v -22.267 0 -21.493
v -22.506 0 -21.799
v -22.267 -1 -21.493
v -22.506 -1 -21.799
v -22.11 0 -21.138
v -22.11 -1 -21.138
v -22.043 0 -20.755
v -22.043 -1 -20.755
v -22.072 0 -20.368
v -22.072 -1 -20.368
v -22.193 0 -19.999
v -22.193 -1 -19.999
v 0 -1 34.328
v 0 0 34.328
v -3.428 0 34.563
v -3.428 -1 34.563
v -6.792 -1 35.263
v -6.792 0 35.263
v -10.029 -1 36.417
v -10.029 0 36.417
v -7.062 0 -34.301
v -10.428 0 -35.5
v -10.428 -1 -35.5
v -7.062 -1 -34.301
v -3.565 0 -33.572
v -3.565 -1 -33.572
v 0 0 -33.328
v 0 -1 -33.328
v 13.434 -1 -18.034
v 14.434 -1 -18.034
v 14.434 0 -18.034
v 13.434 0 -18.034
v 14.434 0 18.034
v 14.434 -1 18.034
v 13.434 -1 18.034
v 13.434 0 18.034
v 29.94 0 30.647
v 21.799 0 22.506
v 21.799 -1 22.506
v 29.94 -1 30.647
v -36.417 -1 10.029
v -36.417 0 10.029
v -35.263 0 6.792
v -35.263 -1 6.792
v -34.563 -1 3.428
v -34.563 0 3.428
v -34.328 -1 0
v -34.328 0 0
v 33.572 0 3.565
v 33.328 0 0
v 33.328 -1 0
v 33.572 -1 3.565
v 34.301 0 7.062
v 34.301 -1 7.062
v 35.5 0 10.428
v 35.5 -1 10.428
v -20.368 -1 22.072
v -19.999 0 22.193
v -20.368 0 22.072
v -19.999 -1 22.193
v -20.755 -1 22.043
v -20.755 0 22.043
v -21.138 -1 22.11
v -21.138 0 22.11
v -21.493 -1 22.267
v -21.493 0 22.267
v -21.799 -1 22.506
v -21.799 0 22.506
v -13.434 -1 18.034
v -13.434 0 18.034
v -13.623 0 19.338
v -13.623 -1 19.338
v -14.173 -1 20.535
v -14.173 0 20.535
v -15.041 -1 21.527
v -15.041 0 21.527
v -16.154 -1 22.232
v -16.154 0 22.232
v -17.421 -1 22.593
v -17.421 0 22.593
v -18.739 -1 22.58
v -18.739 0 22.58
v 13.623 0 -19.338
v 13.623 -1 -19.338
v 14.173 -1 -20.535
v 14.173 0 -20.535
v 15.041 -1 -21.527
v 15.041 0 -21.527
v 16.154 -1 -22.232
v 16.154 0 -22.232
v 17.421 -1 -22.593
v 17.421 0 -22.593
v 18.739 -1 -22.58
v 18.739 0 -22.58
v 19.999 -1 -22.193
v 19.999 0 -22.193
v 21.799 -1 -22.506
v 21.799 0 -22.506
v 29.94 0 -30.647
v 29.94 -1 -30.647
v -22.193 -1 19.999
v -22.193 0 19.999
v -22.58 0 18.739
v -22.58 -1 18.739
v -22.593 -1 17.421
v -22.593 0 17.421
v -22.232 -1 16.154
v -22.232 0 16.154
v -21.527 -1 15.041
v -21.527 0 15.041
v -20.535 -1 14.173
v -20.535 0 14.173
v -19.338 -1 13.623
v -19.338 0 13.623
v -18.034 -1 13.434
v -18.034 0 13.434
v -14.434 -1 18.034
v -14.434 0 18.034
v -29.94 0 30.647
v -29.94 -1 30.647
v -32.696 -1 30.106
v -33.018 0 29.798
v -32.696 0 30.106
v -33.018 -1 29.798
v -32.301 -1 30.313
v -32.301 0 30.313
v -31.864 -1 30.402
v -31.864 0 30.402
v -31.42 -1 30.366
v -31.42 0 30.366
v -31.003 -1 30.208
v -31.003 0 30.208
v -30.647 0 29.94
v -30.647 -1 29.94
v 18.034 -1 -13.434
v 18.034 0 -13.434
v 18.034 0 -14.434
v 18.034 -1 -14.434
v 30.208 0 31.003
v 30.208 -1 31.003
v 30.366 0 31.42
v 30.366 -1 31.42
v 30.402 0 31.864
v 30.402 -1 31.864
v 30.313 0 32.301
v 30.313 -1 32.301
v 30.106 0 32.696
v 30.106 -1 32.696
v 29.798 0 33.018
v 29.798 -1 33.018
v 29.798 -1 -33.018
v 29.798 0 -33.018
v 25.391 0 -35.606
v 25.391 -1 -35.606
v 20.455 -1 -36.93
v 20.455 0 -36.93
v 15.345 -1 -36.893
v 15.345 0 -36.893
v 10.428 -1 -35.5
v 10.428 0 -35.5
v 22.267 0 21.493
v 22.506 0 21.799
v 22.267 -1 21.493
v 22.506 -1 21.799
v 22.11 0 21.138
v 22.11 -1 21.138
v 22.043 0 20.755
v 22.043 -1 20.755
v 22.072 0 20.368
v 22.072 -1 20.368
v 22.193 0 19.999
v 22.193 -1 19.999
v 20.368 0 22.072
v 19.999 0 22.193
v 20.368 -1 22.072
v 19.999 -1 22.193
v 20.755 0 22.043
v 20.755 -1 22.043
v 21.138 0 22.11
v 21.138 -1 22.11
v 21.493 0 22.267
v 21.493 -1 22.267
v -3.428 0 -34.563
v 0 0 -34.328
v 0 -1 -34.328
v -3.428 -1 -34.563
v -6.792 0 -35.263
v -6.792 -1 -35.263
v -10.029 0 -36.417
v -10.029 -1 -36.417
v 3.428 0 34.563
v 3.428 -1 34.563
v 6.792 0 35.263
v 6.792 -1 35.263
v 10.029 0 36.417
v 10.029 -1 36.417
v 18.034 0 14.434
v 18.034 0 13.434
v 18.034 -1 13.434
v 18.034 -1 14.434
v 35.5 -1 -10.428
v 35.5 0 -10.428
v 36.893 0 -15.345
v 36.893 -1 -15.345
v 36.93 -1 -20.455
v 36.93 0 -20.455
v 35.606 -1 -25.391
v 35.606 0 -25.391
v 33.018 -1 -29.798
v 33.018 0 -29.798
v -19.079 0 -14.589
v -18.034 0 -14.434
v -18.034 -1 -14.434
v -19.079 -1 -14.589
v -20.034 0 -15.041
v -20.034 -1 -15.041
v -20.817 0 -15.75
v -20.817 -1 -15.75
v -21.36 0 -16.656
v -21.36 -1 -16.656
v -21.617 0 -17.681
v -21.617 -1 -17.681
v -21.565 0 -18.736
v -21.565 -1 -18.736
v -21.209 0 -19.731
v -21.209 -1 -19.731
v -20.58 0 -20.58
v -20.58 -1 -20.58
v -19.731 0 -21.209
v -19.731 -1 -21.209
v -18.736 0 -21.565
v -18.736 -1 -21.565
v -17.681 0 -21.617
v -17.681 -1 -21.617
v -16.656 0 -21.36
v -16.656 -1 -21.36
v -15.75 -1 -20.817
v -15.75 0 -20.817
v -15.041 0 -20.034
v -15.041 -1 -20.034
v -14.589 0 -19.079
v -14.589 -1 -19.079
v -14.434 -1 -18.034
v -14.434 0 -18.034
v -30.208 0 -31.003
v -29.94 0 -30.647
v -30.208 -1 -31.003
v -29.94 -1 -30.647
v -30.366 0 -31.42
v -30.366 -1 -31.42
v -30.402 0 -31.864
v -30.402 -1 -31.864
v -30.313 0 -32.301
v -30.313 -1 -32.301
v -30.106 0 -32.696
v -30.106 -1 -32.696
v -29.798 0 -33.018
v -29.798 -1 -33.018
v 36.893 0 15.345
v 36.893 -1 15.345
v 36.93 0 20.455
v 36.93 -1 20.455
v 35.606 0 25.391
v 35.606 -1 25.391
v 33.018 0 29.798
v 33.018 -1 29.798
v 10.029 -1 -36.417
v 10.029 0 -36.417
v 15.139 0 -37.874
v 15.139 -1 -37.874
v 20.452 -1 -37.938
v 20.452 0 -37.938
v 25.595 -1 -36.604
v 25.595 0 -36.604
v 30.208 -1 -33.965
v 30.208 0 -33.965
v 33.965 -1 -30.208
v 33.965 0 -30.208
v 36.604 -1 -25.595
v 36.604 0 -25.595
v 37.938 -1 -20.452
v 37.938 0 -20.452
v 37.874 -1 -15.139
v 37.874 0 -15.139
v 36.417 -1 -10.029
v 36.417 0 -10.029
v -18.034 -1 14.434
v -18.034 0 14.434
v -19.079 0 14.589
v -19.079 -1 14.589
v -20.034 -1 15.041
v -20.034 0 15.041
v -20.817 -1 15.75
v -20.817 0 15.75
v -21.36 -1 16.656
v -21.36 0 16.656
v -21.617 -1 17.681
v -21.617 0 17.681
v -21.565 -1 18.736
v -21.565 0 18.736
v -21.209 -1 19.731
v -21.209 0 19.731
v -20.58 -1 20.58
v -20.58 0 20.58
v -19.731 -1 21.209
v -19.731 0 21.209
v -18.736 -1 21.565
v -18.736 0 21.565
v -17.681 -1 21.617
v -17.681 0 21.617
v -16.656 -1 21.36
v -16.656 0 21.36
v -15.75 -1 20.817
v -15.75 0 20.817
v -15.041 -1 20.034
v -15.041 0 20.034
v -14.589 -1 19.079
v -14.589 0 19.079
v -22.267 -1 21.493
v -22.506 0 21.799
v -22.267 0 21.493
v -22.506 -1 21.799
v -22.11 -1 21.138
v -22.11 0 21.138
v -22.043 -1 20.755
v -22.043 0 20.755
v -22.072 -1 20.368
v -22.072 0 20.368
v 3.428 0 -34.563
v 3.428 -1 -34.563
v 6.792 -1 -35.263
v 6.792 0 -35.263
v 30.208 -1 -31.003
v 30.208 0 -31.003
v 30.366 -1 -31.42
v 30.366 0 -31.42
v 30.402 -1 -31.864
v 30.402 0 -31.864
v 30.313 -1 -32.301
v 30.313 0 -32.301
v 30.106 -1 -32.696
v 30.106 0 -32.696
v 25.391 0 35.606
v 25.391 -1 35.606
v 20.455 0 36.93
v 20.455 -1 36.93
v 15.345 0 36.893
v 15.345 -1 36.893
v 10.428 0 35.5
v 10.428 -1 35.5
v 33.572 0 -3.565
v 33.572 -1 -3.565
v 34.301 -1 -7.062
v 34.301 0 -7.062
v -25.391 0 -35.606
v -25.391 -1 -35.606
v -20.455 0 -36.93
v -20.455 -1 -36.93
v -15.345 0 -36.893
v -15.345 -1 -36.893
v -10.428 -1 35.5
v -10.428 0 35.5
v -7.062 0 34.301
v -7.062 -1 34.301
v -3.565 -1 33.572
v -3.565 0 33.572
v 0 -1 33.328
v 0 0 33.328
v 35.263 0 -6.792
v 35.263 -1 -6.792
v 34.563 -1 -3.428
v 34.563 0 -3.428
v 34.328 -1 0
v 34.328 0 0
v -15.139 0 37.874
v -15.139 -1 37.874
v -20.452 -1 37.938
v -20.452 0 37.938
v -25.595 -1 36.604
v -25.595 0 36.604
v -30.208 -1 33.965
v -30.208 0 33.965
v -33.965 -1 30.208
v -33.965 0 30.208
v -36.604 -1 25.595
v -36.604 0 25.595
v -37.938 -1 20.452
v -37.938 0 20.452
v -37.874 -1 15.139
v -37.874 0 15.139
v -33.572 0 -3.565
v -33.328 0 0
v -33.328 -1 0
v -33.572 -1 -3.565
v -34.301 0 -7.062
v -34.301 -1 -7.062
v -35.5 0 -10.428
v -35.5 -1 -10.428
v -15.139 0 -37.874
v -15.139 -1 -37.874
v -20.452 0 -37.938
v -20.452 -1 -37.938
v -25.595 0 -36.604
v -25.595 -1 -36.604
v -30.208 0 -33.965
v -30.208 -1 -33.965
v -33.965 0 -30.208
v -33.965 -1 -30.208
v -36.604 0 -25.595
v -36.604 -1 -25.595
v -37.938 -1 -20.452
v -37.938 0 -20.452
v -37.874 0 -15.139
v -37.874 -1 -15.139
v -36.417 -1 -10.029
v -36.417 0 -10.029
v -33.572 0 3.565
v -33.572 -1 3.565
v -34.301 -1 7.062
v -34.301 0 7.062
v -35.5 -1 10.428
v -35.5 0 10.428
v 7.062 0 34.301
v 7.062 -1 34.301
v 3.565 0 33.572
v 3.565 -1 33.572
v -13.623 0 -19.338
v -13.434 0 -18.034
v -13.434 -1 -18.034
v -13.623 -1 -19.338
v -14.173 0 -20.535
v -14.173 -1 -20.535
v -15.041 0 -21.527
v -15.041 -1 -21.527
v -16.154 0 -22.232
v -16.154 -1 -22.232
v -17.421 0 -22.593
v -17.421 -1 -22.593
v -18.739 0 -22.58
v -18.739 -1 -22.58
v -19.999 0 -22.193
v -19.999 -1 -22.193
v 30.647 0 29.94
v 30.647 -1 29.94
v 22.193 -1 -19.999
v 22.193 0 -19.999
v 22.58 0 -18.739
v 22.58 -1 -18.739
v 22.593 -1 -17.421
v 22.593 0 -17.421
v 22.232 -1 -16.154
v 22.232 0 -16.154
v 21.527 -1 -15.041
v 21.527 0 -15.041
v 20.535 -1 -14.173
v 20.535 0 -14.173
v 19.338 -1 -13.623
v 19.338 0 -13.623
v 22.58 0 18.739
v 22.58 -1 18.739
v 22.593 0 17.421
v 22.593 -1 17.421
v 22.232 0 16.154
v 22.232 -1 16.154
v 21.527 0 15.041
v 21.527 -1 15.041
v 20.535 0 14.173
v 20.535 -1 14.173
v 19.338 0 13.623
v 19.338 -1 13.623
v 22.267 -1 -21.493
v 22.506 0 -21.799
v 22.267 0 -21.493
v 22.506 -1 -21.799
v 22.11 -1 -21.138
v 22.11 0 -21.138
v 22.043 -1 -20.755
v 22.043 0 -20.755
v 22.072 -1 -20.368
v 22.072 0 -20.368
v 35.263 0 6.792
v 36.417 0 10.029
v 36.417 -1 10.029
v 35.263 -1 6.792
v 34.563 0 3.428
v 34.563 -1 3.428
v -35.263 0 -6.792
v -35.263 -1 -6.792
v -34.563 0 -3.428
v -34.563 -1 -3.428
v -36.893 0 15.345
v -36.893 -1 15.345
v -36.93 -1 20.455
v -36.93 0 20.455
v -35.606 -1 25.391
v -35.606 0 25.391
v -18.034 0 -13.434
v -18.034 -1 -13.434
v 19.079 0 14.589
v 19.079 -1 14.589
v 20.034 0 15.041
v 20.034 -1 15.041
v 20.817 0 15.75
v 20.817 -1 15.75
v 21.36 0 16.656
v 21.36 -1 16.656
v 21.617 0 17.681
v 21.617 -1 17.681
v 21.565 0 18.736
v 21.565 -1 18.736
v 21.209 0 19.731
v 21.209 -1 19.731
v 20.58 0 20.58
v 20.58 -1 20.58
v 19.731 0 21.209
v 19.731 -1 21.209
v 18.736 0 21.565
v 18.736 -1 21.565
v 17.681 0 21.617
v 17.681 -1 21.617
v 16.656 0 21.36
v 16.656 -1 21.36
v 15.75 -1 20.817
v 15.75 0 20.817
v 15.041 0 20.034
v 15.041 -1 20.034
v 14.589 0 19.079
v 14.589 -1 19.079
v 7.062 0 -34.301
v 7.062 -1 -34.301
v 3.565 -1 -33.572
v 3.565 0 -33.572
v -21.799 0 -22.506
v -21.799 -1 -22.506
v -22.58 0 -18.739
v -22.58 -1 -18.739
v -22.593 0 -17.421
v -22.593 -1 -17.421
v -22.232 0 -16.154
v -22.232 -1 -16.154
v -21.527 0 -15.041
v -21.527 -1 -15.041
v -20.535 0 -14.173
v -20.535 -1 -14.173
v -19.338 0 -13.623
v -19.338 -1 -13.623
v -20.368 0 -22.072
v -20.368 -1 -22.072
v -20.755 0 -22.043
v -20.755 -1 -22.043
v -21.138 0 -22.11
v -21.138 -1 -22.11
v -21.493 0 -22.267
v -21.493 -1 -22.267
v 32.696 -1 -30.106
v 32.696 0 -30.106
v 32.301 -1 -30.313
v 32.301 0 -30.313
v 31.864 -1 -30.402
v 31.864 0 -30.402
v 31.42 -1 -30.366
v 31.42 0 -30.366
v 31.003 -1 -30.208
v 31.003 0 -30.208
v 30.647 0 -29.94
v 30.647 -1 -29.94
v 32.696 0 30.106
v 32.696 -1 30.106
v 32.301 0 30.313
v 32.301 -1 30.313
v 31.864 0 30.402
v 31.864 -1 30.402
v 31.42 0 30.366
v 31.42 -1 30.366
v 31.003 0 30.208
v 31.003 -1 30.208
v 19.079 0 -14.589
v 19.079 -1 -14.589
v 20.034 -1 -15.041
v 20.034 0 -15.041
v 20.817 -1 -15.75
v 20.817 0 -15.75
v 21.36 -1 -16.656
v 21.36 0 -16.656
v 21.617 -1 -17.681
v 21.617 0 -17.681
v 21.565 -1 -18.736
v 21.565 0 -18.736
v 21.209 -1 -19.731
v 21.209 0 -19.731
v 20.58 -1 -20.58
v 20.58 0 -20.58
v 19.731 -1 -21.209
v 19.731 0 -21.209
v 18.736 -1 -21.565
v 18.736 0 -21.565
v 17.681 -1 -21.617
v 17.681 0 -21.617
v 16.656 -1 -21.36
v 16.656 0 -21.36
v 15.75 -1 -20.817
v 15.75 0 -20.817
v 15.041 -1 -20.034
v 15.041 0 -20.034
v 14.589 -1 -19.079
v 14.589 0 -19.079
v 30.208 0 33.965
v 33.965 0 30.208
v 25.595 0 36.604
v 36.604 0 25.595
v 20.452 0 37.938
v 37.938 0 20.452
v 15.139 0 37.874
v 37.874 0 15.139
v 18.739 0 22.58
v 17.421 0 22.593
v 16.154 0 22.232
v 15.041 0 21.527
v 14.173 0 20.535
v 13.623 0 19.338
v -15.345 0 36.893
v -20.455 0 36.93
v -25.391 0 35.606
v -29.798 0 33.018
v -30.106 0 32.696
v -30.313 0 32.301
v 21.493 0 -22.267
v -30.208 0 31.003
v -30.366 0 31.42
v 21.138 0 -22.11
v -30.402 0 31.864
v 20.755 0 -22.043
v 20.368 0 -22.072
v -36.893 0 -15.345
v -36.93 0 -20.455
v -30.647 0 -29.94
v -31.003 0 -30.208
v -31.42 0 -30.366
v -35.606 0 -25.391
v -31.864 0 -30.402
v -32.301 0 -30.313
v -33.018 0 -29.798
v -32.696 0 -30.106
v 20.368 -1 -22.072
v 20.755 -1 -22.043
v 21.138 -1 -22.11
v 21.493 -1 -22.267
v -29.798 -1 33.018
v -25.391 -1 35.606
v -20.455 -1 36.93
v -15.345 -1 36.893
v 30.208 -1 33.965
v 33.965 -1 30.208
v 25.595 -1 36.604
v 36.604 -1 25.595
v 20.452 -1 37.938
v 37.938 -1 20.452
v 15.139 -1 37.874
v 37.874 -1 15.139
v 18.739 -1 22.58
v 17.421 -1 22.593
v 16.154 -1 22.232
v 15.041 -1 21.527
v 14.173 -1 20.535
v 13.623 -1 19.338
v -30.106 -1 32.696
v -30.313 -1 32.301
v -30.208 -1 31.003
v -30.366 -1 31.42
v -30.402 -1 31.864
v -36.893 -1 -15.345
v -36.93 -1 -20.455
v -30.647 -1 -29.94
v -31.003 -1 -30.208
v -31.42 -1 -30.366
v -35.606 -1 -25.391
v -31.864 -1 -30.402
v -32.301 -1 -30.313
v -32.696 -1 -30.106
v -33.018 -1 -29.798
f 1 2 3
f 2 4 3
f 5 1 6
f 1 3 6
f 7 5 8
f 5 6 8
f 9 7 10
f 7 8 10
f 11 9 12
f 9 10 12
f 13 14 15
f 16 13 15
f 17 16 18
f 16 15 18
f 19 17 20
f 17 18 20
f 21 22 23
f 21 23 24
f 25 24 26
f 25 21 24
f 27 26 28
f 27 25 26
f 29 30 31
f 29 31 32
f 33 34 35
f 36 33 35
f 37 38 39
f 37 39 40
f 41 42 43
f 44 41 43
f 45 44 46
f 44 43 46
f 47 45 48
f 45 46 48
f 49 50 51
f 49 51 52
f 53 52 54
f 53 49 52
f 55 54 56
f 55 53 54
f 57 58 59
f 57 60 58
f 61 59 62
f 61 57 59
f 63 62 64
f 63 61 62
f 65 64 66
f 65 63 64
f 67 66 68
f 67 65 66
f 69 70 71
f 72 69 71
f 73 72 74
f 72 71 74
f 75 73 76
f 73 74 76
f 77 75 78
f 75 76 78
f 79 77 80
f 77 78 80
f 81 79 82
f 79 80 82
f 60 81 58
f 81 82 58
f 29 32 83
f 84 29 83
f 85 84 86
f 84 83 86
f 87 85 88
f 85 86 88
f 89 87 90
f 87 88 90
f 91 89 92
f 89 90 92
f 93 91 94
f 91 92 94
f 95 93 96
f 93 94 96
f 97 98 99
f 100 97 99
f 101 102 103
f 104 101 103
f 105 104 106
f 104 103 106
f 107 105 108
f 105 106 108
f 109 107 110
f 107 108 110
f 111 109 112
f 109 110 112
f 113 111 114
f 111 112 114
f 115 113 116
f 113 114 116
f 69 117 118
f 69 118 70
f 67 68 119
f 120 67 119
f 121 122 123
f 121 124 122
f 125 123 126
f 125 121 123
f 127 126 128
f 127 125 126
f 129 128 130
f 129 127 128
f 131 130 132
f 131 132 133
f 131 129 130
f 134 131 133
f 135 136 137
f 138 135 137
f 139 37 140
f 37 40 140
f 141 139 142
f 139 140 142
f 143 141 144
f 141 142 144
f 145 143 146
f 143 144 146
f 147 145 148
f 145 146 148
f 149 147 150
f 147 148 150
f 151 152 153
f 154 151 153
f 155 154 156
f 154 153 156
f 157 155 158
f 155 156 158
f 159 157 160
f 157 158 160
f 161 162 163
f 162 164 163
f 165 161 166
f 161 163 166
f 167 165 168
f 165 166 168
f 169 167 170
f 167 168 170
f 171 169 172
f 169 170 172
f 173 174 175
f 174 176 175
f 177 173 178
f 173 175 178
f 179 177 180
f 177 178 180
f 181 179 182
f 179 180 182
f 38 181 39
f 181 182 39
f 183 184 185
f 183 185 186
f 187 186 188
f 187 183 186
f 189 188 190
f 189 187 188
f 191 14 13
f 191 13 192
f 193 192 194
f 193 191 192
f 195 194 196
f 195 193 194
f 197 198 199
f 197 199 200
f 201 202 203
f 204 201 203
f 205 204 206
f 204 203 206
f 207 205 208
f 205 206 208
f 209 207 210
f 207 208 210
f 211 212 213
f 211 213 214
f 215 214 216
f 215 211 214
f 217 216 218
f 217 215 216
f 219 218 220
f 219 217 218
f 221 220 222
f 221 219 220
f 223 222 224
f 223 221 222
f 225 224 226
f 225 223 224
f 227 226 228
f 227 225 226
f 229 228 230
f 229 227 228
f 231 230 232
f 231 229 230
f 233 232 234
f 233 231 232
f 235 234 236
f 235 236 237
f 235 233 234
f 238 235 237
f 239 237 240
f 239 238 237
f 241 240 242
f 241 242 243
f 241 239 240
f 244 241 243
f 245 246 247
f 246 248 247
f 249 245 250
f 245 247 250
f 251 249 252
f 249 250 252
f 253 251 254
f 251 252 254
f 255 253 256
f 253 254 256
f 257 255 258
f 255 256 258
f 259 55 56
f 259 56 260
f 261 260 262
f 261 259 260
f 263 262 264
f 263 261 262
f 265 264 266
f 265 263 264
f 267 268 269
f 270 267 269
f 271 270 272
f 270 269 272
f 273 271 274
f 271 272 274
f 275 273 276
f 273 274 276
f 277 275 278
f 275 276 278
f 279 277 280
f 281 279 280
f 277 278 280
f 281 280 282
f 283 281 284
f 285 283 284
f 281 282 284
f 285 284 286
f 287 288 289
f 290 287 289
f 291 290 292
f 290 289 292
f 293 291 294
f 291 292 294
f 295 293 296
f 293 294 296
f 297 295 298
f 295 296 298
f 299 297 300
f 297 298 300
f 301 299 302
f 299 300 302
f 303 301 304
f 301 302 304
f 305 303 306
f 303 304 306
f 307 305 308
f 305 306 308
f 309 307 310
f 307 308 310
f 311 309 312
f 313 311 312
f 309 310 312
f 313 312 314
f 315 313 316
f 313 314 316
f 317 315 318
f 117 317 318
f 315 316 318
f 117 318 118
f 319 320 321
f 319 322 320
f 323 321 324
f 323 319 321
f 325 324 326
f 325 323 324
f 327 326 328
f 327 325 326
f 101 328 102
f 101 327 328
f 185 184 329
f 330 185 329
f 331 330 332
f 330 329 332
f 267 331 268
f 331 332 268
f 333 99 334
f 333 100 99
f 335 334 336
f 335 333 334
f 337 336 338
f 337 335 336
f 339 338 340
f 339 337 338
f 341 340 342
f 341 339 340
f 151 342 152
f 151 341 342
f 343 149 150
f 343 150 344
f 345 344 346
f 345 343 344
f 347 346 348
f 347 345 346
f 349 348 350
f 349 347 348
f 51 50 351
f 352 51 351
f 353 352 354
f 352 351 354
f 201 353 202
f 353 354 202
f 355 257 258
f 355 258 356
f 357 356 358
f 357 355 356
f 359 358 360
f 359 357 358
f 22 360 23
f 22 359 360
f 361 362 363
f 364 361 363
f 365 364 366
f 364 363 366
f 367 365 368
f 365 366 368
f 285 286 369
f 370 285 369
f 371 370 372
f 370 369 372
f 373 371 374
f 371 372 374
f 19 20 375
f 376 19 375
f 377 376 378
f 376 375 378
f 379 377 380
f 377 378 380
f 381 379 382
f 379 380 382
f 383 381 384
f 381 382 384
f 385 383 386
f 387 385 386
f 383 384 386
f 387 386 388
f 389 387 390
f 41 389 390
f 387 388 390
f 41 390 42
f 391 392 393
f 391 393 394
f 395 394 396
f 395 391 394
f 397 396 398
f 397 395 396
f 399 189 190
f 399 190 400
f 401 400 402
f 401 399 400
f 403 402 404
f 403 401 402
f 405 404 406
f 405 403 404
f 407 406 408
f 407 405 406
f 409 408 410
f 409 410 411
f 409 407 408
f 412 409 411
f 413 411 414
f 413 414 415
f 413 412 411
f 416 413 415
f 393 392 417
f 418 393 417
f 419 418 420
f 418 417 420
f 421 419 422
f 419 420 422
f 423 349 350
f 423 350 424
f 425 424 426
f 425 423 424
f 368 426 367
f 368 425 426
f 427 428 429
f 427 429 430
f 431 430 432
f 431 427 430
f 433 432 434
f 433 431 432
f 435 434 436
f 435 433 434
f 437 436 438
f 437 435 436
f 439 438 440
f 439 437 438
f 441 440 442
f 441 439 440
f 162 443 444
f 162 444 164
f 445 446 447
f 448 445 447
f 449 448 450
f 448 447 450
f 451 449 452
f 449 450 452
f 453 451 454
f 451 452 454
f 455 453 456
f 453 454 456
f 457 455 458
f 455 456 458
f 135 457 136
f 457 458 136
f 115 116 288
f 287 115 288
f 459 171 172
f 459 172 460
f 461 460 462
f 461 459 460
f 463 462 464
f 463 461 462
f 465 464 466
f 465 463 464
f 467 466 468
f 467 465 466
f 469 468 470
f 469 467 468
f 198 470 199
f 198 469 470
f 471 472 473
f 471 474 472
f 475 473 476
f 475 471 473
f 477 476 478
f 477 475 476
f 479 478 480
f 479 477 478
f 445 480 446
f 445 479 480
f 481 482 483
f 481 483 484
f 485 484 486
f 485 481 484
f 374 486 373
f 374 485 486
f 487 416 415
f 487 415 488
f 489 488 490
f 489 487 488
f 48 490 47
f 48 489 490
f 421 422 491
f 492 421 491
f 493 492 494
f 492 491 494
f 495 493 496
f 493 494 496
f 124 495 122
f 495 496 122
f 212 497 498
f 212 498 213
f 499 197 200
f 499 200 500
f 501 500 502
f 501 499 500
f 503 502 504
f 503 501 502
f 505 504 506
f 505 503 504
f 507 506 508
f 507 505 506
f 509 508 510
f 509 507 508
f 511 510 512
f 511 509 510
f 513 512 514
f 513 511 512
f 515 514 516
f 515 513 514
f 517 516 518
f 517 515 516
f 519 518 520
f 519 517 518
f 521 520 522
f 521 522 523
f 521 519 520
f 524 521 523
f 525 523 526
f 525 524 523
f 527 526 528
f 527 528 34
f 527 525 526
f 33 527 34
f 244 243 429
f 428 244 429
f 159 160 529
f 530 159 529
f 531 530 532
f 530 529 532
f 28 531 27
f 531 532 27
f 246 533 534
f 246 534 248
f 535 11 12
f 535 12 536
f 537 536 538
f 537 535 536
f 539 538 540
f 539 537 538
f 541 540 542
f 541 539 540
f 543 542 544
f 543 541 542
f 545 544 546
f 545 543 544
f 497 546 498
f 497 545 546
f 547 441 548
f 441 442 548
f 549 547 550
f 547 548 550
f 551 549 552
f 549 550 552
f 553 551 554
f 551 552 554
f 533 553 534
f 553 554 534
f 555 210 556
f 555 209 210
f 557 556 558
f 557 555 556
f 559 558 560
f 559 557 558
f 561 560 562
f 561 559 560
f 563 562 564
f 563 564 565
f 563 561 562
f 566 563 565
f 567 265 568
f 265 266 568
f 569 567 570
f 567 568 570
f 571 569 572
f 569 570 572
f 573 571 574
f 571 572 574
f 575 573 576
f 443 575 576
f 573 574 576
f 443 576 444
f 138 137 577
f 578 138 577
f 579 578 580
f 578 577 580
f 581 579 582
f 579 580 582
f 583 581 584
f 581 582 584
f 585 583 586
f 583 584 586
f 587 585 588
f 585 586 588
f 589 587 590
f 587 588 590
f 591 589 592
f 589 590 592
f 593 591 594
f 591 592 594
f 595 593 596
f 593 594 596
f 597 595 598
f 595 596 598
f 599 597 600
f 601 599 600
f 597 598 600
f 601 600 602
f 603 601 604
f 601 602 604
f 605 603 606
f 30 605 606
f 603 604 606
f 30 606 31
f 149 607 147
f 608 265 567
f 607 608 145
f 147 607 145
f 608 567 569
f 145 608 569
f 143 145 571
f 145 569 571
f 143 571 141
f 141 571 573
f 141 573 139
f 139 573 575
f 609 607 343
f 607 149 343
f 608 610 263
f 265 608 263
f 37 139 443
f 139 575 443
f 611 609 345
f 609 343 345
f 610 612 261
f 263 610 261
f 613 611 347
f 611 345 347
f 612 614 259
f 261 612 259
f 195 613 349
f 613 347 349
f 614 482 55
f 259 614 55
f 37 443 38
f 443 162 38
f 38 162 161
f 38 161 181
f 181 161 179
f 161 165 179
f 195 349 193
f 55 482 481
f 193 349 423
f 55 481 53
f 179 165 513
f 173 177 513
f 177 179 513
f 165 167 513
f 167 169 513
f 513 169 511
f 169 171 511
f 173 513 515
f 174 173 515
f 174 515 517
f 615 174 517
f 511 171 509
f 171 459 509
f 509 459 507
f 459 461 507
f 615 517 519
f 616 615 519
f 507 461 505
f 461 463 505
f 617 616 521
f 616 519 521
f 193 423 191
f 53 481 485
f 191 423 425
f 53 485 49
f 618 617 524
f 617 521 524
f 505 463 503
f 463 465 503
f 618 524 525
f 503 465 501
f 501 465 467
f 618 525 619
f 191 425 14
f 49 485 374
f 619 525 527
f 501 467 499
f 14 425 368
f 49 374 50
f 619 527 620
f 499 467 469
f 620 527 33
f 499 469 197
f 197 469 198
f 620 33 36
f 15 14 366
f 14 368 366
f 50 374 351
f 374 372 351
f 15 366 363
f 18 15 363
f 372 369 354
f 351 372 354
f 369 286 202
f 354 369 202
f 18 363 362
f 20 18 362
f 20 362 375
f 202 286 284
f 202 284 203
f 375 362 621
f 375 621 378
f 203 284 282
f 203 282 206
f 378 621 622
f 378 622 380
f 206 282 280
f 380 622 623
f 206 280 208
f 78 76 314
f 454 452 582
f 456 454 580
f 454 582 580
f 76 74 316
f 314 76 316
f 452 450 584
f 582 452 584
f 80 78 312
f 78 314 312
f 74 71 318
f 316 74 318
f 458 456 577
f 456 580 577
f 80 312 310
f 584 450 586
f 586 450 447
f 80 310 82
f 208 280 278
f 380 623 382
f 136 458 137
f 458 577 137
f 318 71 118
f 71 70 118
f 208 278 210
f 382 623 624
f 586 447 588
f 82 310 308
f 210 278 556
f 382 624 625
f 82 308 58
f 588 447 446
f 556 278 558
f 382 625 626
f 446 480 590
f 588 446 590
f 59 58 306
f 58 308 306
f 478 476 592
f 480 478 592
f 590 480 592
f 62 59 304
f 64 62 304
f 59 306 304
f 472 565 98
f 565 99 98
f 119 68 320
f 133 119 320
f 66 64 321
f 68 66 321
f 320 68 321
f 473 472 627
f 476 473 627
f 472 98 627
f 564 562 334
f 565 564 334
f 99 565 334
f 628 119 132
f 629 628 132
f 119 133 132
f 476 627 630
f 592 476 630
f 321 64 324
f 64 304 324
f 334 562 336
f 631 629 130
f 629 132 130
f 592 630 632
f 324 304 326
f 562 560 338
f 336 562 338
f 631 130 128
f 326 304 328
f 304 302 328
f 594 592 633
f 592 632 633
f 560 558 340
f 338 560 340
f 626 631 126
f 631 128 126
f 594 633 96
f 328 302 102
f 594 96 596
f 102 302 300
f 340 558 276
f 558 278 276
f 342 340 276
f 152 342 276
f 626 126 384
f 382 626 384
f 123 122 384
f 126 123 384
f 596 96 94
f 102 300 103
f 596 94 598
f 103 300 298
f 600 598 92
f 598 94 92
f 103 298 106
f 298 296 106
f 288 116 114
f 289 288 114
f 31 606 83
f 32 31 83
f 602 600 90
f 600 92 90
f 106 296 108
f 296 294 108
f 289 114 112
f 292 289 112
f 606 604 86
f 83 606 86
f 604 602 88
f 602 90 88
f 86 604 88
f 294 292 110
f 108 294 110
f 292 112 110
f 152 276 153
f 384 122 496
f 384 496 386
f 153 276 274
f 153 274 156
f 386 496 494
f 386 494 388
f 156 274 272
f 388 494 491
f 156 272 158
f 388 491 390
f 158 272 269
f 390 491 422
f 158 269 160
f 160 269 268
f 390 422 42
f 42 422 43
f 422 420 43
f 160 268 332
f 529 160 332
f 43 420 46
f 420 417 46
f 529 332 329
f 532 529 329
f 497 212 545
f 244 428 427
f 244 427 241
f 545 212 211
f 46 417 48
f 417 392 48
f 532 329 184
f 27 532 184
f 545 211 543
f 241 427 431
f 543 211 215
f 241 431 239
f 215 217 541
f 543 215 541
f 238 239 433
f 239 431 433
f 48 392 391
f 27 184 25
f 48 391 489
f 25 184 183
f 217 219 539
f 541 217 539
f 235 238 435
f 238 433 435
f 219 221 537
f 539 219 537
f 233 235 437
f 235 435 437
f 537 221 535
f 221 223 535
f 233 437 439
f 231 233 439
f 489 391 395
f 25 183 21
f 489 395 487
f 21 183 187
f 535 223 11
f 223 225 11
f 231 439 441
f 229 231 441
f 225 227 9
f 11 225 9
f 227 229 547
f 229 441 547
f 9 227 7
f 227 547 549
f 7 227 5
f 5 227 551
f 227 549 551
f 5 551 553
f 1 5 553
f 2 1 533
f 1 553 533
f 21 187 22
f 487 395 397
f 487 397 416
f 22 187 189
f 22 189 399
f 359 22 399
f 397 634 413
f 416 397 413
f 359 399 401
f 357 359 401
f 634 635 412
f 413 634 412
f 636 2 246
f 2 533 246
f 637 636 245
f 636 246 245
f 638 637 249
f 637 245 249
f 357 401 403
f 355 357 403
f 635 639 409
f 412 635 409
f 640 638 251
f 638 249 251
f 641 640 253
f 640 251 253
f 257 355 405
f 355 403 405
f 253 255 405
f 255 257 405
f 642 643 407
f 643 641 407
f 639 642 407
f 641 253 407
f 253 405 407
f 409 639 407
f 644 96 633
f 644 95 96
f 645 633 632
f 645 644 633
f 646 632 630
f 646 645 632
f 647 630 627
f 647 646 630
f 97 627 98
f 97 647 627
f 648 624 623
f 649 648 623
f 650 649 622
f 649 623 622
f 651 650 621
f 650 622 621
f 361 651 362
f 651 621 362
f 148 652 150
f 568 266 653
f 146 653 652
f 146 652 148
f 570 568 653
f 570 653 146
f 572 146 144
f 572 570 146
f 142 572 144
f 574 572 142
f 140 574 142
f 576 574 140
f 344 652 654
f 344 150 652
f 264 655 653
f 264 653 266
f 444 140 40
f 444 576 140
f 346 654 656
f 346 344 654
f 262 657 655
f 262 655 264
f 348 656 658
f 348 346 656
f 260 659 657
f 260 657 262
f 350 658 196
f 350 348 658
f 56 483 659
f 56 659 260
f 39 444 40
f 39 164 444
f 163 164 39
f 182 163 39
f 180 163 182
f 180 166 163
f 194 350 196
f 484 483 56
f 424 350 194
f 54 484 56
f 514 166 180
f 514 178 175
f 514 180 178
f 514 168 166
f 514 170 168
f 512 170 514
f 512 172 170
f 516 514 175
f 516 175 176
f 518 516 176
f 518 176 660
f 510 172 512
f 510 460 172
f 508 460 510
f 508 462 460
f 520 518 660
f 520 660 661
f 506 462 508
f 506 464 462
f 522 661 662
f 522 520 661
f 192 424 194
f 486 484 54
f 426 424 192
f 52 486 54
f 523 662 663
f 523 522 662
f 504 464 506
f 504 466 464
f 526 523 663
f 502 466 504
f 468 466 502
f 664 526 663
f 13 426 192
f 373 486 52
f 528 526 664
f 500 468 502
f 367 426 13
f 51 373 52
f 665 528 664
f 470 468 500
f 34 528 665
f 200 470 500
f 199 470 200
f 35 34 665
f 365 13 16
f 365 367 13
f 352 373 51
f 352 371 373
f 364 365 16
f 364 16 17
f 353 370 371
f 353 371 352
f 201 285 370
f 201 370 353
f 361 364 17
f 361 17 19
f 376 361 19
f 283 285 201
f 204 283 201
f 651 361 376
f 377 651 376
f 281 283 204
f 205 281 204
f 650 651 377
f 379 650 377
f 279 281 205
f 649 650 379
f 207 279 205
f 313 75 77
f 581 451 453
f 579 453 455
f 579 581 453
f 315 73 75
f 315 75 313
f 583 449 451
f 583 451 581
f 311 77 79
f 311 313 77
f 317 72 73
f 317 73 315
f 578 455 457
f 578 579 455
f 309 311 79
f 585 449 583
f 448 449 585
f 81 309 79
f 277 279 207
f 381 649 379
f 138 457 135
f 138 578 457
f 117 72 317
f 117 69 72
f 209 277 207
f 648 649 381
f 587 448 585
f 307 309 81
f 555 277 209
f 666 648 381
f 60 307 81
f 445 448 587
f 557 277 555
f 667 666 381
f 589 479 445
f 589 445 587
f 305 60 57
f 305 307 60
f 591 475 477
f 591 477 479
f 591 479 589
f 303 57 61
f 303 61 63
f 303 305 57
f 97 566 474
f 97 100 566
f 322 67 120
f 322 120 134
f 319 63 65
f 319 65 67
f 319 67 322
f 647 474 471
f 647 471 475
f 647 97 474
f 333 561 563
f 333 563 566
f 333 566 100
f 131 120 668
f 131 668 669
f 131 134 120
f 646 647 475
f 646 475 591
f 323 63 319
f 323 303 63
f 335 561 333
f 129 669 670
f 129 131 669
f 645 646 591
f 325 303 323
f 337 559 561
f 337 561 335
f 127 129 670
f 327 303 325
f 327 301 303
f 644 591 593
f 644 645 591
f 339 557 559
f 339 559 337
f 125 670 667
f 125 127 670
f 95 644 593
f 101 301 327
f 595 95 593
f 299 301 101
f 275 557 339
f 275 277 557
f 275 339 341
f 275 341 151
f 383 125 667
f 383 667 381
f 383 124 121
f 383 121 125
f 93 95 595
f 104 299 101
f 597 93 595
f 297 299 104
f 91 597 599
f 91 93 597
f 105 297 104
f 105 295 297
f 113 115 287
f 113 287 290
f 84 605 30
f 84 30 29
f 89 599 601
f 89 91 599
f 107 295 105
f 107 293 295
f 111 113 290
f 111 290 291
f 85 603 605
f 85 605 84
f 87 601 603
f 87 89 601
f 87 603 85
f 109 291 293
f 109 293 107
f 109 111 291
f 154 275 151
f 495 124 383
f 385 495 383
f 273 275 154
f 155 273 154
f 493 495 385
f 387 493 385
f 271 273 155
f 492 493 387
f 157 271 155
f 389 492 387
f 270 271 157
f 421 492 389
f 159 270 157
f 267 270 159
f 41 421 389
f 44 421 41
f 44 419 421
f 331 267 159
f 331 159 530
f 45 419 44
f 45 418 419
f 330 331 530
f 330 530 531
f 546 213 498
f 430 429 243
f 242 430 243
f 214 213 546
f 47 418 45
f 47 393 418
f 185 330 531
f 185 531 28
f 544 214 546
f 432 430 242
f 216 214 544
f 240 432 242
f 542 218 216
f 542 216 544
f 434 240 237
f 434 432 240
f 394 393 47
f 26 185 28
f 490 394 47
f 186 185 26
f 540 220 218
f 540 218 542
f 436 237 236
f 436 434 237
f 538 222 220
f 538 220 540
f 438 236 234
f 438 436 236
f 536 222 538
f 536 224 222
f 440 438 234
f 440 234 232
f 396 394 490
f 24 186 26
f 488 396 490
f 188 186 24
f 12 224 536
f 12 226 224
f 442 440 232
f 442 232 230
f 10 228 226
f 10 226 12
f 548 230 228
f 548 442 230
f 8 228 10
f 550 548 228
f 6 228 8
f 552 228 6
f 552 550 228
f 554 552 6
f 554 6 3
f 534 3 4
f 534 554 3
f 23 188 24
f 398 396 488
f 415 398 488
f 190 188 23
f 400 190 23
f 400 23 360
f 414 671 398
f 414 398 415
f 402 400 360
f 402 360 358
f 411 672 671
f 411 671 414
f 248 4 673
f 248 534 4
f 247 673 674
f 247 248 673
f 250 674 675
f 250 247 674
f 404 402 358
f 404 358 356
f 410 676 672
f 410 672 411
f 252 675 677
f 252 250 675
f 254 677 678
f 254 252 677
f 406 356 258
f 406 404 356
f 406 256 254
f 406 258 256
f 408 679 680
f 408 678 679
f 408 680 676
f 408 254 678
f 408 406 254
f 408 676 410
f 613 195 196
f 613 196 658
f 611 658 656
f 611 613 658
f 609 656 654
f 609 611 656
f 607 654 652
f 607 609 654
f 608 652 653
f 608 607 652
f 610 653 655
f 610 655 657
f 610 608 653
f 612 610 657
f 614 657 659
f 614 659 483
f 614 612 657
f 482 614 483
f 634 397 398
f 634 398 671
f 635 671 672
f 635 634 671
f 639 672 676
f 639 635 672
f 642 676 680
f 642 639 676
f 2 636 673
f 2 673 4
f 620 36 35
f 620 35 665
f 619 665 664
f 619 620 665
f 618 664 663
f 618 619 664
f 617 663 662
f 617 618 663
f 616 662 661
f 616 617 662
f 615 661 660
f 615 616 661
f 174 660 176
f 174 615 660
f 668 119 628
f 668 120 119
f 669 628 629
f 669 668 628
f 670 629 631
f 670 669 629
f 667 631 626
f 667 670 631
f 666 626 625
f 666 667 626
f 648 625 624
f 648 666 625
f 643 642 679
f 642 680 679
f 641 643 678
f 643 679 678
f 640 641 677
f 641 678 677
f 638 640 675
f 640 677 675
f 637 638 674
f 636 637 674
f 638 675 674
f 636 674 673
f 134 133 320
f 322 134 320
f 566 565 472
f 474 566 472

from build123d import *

# Parameters (mm, degrees)
F1_DEPTH = 1
F2_R     = 1.5875


with BuildPart() as f1:
    # F0 (on Front) → F1 (new body)
    with BuildSketch(Plane.XZ):
        with BuildLine():
            ThreePointArc((-18.034, 14.434), (-20.579584, 20.579584), (-14.434, 18.034))
            Line((-14.434, 18.034), (-13.434, 18.034))
            ThreePointArc((-13.434, 18.034), (-16.044953, 22.181733), (-20.913866, 21.620973))
            Line((-20.913866, 21.620973), (-31.14619, 31.853297))
            ThreePointArc((-31.14619, 31.853297), (-21.336036, 36.795638), (-10.427948, 35.499694))
            ThreePointArc((-10.427948, 35.499694), (-5.325882, 33.87639), (0, 33.3276))
            Line((0, 33.3276), (0, 34.3276))
            ThreePointArc((0, 34.3276), (-5.121964, 34.855377), (-10.02868, 36.416529))
            ThreePointArc((-10.02868, 36.416529), (-32.211491, 32.211491), (-36.416529, 10.02868))
            ThreePointArc((-36.416529, 10.02868), (-34.855377, 5.121964), (-34.3276, 0))
            Line((-34.3276, 0), (-33.3276, 0))
            ThreePointArc((-33.3276, 0), (-33.87639, 5.325882), (-35.499694, 10.427948))
            ThreePointArc((-35.499694, 10.427948), (-36.795638, 21.336036), (-31.853297, 31.14619))
            Line((-31.853297, 31.14619), (-21.620973, 20.913866))
            ThreePointArc((-21.620973, 20.913866), (-22.181733, 16.044953), (-18.034, 13.434))
            Line((-18.034, 13.434), (-18.034, 14.434))
        make_face()
    extrude(amount=F1_DEPTH)

    # F2
    f2_edges = [f1.edges().sort_by_distance(p)[0] for p in [
        (-31.853297, -0.5, 31.14619),
        (-31.14619, -0.5, 31.853297),
        (-20.913866, -0.5, 21.620973),
        (-21.620973, -0.5, 20.913866),
    ]]
    fillet(f2_edges, radius=F2_R)

    # F3: F1 across plane


with BuildPart() as f1_1:
    add(f1.part)
    add(f1.part.mirror(Plane.XY))

    # F4: F1 across plane


with BuildPart() as f1_2:
    add(f1_1.part)
    add(f1_1.part.mirror(Plane.YZ))


solid = f1_2.part
